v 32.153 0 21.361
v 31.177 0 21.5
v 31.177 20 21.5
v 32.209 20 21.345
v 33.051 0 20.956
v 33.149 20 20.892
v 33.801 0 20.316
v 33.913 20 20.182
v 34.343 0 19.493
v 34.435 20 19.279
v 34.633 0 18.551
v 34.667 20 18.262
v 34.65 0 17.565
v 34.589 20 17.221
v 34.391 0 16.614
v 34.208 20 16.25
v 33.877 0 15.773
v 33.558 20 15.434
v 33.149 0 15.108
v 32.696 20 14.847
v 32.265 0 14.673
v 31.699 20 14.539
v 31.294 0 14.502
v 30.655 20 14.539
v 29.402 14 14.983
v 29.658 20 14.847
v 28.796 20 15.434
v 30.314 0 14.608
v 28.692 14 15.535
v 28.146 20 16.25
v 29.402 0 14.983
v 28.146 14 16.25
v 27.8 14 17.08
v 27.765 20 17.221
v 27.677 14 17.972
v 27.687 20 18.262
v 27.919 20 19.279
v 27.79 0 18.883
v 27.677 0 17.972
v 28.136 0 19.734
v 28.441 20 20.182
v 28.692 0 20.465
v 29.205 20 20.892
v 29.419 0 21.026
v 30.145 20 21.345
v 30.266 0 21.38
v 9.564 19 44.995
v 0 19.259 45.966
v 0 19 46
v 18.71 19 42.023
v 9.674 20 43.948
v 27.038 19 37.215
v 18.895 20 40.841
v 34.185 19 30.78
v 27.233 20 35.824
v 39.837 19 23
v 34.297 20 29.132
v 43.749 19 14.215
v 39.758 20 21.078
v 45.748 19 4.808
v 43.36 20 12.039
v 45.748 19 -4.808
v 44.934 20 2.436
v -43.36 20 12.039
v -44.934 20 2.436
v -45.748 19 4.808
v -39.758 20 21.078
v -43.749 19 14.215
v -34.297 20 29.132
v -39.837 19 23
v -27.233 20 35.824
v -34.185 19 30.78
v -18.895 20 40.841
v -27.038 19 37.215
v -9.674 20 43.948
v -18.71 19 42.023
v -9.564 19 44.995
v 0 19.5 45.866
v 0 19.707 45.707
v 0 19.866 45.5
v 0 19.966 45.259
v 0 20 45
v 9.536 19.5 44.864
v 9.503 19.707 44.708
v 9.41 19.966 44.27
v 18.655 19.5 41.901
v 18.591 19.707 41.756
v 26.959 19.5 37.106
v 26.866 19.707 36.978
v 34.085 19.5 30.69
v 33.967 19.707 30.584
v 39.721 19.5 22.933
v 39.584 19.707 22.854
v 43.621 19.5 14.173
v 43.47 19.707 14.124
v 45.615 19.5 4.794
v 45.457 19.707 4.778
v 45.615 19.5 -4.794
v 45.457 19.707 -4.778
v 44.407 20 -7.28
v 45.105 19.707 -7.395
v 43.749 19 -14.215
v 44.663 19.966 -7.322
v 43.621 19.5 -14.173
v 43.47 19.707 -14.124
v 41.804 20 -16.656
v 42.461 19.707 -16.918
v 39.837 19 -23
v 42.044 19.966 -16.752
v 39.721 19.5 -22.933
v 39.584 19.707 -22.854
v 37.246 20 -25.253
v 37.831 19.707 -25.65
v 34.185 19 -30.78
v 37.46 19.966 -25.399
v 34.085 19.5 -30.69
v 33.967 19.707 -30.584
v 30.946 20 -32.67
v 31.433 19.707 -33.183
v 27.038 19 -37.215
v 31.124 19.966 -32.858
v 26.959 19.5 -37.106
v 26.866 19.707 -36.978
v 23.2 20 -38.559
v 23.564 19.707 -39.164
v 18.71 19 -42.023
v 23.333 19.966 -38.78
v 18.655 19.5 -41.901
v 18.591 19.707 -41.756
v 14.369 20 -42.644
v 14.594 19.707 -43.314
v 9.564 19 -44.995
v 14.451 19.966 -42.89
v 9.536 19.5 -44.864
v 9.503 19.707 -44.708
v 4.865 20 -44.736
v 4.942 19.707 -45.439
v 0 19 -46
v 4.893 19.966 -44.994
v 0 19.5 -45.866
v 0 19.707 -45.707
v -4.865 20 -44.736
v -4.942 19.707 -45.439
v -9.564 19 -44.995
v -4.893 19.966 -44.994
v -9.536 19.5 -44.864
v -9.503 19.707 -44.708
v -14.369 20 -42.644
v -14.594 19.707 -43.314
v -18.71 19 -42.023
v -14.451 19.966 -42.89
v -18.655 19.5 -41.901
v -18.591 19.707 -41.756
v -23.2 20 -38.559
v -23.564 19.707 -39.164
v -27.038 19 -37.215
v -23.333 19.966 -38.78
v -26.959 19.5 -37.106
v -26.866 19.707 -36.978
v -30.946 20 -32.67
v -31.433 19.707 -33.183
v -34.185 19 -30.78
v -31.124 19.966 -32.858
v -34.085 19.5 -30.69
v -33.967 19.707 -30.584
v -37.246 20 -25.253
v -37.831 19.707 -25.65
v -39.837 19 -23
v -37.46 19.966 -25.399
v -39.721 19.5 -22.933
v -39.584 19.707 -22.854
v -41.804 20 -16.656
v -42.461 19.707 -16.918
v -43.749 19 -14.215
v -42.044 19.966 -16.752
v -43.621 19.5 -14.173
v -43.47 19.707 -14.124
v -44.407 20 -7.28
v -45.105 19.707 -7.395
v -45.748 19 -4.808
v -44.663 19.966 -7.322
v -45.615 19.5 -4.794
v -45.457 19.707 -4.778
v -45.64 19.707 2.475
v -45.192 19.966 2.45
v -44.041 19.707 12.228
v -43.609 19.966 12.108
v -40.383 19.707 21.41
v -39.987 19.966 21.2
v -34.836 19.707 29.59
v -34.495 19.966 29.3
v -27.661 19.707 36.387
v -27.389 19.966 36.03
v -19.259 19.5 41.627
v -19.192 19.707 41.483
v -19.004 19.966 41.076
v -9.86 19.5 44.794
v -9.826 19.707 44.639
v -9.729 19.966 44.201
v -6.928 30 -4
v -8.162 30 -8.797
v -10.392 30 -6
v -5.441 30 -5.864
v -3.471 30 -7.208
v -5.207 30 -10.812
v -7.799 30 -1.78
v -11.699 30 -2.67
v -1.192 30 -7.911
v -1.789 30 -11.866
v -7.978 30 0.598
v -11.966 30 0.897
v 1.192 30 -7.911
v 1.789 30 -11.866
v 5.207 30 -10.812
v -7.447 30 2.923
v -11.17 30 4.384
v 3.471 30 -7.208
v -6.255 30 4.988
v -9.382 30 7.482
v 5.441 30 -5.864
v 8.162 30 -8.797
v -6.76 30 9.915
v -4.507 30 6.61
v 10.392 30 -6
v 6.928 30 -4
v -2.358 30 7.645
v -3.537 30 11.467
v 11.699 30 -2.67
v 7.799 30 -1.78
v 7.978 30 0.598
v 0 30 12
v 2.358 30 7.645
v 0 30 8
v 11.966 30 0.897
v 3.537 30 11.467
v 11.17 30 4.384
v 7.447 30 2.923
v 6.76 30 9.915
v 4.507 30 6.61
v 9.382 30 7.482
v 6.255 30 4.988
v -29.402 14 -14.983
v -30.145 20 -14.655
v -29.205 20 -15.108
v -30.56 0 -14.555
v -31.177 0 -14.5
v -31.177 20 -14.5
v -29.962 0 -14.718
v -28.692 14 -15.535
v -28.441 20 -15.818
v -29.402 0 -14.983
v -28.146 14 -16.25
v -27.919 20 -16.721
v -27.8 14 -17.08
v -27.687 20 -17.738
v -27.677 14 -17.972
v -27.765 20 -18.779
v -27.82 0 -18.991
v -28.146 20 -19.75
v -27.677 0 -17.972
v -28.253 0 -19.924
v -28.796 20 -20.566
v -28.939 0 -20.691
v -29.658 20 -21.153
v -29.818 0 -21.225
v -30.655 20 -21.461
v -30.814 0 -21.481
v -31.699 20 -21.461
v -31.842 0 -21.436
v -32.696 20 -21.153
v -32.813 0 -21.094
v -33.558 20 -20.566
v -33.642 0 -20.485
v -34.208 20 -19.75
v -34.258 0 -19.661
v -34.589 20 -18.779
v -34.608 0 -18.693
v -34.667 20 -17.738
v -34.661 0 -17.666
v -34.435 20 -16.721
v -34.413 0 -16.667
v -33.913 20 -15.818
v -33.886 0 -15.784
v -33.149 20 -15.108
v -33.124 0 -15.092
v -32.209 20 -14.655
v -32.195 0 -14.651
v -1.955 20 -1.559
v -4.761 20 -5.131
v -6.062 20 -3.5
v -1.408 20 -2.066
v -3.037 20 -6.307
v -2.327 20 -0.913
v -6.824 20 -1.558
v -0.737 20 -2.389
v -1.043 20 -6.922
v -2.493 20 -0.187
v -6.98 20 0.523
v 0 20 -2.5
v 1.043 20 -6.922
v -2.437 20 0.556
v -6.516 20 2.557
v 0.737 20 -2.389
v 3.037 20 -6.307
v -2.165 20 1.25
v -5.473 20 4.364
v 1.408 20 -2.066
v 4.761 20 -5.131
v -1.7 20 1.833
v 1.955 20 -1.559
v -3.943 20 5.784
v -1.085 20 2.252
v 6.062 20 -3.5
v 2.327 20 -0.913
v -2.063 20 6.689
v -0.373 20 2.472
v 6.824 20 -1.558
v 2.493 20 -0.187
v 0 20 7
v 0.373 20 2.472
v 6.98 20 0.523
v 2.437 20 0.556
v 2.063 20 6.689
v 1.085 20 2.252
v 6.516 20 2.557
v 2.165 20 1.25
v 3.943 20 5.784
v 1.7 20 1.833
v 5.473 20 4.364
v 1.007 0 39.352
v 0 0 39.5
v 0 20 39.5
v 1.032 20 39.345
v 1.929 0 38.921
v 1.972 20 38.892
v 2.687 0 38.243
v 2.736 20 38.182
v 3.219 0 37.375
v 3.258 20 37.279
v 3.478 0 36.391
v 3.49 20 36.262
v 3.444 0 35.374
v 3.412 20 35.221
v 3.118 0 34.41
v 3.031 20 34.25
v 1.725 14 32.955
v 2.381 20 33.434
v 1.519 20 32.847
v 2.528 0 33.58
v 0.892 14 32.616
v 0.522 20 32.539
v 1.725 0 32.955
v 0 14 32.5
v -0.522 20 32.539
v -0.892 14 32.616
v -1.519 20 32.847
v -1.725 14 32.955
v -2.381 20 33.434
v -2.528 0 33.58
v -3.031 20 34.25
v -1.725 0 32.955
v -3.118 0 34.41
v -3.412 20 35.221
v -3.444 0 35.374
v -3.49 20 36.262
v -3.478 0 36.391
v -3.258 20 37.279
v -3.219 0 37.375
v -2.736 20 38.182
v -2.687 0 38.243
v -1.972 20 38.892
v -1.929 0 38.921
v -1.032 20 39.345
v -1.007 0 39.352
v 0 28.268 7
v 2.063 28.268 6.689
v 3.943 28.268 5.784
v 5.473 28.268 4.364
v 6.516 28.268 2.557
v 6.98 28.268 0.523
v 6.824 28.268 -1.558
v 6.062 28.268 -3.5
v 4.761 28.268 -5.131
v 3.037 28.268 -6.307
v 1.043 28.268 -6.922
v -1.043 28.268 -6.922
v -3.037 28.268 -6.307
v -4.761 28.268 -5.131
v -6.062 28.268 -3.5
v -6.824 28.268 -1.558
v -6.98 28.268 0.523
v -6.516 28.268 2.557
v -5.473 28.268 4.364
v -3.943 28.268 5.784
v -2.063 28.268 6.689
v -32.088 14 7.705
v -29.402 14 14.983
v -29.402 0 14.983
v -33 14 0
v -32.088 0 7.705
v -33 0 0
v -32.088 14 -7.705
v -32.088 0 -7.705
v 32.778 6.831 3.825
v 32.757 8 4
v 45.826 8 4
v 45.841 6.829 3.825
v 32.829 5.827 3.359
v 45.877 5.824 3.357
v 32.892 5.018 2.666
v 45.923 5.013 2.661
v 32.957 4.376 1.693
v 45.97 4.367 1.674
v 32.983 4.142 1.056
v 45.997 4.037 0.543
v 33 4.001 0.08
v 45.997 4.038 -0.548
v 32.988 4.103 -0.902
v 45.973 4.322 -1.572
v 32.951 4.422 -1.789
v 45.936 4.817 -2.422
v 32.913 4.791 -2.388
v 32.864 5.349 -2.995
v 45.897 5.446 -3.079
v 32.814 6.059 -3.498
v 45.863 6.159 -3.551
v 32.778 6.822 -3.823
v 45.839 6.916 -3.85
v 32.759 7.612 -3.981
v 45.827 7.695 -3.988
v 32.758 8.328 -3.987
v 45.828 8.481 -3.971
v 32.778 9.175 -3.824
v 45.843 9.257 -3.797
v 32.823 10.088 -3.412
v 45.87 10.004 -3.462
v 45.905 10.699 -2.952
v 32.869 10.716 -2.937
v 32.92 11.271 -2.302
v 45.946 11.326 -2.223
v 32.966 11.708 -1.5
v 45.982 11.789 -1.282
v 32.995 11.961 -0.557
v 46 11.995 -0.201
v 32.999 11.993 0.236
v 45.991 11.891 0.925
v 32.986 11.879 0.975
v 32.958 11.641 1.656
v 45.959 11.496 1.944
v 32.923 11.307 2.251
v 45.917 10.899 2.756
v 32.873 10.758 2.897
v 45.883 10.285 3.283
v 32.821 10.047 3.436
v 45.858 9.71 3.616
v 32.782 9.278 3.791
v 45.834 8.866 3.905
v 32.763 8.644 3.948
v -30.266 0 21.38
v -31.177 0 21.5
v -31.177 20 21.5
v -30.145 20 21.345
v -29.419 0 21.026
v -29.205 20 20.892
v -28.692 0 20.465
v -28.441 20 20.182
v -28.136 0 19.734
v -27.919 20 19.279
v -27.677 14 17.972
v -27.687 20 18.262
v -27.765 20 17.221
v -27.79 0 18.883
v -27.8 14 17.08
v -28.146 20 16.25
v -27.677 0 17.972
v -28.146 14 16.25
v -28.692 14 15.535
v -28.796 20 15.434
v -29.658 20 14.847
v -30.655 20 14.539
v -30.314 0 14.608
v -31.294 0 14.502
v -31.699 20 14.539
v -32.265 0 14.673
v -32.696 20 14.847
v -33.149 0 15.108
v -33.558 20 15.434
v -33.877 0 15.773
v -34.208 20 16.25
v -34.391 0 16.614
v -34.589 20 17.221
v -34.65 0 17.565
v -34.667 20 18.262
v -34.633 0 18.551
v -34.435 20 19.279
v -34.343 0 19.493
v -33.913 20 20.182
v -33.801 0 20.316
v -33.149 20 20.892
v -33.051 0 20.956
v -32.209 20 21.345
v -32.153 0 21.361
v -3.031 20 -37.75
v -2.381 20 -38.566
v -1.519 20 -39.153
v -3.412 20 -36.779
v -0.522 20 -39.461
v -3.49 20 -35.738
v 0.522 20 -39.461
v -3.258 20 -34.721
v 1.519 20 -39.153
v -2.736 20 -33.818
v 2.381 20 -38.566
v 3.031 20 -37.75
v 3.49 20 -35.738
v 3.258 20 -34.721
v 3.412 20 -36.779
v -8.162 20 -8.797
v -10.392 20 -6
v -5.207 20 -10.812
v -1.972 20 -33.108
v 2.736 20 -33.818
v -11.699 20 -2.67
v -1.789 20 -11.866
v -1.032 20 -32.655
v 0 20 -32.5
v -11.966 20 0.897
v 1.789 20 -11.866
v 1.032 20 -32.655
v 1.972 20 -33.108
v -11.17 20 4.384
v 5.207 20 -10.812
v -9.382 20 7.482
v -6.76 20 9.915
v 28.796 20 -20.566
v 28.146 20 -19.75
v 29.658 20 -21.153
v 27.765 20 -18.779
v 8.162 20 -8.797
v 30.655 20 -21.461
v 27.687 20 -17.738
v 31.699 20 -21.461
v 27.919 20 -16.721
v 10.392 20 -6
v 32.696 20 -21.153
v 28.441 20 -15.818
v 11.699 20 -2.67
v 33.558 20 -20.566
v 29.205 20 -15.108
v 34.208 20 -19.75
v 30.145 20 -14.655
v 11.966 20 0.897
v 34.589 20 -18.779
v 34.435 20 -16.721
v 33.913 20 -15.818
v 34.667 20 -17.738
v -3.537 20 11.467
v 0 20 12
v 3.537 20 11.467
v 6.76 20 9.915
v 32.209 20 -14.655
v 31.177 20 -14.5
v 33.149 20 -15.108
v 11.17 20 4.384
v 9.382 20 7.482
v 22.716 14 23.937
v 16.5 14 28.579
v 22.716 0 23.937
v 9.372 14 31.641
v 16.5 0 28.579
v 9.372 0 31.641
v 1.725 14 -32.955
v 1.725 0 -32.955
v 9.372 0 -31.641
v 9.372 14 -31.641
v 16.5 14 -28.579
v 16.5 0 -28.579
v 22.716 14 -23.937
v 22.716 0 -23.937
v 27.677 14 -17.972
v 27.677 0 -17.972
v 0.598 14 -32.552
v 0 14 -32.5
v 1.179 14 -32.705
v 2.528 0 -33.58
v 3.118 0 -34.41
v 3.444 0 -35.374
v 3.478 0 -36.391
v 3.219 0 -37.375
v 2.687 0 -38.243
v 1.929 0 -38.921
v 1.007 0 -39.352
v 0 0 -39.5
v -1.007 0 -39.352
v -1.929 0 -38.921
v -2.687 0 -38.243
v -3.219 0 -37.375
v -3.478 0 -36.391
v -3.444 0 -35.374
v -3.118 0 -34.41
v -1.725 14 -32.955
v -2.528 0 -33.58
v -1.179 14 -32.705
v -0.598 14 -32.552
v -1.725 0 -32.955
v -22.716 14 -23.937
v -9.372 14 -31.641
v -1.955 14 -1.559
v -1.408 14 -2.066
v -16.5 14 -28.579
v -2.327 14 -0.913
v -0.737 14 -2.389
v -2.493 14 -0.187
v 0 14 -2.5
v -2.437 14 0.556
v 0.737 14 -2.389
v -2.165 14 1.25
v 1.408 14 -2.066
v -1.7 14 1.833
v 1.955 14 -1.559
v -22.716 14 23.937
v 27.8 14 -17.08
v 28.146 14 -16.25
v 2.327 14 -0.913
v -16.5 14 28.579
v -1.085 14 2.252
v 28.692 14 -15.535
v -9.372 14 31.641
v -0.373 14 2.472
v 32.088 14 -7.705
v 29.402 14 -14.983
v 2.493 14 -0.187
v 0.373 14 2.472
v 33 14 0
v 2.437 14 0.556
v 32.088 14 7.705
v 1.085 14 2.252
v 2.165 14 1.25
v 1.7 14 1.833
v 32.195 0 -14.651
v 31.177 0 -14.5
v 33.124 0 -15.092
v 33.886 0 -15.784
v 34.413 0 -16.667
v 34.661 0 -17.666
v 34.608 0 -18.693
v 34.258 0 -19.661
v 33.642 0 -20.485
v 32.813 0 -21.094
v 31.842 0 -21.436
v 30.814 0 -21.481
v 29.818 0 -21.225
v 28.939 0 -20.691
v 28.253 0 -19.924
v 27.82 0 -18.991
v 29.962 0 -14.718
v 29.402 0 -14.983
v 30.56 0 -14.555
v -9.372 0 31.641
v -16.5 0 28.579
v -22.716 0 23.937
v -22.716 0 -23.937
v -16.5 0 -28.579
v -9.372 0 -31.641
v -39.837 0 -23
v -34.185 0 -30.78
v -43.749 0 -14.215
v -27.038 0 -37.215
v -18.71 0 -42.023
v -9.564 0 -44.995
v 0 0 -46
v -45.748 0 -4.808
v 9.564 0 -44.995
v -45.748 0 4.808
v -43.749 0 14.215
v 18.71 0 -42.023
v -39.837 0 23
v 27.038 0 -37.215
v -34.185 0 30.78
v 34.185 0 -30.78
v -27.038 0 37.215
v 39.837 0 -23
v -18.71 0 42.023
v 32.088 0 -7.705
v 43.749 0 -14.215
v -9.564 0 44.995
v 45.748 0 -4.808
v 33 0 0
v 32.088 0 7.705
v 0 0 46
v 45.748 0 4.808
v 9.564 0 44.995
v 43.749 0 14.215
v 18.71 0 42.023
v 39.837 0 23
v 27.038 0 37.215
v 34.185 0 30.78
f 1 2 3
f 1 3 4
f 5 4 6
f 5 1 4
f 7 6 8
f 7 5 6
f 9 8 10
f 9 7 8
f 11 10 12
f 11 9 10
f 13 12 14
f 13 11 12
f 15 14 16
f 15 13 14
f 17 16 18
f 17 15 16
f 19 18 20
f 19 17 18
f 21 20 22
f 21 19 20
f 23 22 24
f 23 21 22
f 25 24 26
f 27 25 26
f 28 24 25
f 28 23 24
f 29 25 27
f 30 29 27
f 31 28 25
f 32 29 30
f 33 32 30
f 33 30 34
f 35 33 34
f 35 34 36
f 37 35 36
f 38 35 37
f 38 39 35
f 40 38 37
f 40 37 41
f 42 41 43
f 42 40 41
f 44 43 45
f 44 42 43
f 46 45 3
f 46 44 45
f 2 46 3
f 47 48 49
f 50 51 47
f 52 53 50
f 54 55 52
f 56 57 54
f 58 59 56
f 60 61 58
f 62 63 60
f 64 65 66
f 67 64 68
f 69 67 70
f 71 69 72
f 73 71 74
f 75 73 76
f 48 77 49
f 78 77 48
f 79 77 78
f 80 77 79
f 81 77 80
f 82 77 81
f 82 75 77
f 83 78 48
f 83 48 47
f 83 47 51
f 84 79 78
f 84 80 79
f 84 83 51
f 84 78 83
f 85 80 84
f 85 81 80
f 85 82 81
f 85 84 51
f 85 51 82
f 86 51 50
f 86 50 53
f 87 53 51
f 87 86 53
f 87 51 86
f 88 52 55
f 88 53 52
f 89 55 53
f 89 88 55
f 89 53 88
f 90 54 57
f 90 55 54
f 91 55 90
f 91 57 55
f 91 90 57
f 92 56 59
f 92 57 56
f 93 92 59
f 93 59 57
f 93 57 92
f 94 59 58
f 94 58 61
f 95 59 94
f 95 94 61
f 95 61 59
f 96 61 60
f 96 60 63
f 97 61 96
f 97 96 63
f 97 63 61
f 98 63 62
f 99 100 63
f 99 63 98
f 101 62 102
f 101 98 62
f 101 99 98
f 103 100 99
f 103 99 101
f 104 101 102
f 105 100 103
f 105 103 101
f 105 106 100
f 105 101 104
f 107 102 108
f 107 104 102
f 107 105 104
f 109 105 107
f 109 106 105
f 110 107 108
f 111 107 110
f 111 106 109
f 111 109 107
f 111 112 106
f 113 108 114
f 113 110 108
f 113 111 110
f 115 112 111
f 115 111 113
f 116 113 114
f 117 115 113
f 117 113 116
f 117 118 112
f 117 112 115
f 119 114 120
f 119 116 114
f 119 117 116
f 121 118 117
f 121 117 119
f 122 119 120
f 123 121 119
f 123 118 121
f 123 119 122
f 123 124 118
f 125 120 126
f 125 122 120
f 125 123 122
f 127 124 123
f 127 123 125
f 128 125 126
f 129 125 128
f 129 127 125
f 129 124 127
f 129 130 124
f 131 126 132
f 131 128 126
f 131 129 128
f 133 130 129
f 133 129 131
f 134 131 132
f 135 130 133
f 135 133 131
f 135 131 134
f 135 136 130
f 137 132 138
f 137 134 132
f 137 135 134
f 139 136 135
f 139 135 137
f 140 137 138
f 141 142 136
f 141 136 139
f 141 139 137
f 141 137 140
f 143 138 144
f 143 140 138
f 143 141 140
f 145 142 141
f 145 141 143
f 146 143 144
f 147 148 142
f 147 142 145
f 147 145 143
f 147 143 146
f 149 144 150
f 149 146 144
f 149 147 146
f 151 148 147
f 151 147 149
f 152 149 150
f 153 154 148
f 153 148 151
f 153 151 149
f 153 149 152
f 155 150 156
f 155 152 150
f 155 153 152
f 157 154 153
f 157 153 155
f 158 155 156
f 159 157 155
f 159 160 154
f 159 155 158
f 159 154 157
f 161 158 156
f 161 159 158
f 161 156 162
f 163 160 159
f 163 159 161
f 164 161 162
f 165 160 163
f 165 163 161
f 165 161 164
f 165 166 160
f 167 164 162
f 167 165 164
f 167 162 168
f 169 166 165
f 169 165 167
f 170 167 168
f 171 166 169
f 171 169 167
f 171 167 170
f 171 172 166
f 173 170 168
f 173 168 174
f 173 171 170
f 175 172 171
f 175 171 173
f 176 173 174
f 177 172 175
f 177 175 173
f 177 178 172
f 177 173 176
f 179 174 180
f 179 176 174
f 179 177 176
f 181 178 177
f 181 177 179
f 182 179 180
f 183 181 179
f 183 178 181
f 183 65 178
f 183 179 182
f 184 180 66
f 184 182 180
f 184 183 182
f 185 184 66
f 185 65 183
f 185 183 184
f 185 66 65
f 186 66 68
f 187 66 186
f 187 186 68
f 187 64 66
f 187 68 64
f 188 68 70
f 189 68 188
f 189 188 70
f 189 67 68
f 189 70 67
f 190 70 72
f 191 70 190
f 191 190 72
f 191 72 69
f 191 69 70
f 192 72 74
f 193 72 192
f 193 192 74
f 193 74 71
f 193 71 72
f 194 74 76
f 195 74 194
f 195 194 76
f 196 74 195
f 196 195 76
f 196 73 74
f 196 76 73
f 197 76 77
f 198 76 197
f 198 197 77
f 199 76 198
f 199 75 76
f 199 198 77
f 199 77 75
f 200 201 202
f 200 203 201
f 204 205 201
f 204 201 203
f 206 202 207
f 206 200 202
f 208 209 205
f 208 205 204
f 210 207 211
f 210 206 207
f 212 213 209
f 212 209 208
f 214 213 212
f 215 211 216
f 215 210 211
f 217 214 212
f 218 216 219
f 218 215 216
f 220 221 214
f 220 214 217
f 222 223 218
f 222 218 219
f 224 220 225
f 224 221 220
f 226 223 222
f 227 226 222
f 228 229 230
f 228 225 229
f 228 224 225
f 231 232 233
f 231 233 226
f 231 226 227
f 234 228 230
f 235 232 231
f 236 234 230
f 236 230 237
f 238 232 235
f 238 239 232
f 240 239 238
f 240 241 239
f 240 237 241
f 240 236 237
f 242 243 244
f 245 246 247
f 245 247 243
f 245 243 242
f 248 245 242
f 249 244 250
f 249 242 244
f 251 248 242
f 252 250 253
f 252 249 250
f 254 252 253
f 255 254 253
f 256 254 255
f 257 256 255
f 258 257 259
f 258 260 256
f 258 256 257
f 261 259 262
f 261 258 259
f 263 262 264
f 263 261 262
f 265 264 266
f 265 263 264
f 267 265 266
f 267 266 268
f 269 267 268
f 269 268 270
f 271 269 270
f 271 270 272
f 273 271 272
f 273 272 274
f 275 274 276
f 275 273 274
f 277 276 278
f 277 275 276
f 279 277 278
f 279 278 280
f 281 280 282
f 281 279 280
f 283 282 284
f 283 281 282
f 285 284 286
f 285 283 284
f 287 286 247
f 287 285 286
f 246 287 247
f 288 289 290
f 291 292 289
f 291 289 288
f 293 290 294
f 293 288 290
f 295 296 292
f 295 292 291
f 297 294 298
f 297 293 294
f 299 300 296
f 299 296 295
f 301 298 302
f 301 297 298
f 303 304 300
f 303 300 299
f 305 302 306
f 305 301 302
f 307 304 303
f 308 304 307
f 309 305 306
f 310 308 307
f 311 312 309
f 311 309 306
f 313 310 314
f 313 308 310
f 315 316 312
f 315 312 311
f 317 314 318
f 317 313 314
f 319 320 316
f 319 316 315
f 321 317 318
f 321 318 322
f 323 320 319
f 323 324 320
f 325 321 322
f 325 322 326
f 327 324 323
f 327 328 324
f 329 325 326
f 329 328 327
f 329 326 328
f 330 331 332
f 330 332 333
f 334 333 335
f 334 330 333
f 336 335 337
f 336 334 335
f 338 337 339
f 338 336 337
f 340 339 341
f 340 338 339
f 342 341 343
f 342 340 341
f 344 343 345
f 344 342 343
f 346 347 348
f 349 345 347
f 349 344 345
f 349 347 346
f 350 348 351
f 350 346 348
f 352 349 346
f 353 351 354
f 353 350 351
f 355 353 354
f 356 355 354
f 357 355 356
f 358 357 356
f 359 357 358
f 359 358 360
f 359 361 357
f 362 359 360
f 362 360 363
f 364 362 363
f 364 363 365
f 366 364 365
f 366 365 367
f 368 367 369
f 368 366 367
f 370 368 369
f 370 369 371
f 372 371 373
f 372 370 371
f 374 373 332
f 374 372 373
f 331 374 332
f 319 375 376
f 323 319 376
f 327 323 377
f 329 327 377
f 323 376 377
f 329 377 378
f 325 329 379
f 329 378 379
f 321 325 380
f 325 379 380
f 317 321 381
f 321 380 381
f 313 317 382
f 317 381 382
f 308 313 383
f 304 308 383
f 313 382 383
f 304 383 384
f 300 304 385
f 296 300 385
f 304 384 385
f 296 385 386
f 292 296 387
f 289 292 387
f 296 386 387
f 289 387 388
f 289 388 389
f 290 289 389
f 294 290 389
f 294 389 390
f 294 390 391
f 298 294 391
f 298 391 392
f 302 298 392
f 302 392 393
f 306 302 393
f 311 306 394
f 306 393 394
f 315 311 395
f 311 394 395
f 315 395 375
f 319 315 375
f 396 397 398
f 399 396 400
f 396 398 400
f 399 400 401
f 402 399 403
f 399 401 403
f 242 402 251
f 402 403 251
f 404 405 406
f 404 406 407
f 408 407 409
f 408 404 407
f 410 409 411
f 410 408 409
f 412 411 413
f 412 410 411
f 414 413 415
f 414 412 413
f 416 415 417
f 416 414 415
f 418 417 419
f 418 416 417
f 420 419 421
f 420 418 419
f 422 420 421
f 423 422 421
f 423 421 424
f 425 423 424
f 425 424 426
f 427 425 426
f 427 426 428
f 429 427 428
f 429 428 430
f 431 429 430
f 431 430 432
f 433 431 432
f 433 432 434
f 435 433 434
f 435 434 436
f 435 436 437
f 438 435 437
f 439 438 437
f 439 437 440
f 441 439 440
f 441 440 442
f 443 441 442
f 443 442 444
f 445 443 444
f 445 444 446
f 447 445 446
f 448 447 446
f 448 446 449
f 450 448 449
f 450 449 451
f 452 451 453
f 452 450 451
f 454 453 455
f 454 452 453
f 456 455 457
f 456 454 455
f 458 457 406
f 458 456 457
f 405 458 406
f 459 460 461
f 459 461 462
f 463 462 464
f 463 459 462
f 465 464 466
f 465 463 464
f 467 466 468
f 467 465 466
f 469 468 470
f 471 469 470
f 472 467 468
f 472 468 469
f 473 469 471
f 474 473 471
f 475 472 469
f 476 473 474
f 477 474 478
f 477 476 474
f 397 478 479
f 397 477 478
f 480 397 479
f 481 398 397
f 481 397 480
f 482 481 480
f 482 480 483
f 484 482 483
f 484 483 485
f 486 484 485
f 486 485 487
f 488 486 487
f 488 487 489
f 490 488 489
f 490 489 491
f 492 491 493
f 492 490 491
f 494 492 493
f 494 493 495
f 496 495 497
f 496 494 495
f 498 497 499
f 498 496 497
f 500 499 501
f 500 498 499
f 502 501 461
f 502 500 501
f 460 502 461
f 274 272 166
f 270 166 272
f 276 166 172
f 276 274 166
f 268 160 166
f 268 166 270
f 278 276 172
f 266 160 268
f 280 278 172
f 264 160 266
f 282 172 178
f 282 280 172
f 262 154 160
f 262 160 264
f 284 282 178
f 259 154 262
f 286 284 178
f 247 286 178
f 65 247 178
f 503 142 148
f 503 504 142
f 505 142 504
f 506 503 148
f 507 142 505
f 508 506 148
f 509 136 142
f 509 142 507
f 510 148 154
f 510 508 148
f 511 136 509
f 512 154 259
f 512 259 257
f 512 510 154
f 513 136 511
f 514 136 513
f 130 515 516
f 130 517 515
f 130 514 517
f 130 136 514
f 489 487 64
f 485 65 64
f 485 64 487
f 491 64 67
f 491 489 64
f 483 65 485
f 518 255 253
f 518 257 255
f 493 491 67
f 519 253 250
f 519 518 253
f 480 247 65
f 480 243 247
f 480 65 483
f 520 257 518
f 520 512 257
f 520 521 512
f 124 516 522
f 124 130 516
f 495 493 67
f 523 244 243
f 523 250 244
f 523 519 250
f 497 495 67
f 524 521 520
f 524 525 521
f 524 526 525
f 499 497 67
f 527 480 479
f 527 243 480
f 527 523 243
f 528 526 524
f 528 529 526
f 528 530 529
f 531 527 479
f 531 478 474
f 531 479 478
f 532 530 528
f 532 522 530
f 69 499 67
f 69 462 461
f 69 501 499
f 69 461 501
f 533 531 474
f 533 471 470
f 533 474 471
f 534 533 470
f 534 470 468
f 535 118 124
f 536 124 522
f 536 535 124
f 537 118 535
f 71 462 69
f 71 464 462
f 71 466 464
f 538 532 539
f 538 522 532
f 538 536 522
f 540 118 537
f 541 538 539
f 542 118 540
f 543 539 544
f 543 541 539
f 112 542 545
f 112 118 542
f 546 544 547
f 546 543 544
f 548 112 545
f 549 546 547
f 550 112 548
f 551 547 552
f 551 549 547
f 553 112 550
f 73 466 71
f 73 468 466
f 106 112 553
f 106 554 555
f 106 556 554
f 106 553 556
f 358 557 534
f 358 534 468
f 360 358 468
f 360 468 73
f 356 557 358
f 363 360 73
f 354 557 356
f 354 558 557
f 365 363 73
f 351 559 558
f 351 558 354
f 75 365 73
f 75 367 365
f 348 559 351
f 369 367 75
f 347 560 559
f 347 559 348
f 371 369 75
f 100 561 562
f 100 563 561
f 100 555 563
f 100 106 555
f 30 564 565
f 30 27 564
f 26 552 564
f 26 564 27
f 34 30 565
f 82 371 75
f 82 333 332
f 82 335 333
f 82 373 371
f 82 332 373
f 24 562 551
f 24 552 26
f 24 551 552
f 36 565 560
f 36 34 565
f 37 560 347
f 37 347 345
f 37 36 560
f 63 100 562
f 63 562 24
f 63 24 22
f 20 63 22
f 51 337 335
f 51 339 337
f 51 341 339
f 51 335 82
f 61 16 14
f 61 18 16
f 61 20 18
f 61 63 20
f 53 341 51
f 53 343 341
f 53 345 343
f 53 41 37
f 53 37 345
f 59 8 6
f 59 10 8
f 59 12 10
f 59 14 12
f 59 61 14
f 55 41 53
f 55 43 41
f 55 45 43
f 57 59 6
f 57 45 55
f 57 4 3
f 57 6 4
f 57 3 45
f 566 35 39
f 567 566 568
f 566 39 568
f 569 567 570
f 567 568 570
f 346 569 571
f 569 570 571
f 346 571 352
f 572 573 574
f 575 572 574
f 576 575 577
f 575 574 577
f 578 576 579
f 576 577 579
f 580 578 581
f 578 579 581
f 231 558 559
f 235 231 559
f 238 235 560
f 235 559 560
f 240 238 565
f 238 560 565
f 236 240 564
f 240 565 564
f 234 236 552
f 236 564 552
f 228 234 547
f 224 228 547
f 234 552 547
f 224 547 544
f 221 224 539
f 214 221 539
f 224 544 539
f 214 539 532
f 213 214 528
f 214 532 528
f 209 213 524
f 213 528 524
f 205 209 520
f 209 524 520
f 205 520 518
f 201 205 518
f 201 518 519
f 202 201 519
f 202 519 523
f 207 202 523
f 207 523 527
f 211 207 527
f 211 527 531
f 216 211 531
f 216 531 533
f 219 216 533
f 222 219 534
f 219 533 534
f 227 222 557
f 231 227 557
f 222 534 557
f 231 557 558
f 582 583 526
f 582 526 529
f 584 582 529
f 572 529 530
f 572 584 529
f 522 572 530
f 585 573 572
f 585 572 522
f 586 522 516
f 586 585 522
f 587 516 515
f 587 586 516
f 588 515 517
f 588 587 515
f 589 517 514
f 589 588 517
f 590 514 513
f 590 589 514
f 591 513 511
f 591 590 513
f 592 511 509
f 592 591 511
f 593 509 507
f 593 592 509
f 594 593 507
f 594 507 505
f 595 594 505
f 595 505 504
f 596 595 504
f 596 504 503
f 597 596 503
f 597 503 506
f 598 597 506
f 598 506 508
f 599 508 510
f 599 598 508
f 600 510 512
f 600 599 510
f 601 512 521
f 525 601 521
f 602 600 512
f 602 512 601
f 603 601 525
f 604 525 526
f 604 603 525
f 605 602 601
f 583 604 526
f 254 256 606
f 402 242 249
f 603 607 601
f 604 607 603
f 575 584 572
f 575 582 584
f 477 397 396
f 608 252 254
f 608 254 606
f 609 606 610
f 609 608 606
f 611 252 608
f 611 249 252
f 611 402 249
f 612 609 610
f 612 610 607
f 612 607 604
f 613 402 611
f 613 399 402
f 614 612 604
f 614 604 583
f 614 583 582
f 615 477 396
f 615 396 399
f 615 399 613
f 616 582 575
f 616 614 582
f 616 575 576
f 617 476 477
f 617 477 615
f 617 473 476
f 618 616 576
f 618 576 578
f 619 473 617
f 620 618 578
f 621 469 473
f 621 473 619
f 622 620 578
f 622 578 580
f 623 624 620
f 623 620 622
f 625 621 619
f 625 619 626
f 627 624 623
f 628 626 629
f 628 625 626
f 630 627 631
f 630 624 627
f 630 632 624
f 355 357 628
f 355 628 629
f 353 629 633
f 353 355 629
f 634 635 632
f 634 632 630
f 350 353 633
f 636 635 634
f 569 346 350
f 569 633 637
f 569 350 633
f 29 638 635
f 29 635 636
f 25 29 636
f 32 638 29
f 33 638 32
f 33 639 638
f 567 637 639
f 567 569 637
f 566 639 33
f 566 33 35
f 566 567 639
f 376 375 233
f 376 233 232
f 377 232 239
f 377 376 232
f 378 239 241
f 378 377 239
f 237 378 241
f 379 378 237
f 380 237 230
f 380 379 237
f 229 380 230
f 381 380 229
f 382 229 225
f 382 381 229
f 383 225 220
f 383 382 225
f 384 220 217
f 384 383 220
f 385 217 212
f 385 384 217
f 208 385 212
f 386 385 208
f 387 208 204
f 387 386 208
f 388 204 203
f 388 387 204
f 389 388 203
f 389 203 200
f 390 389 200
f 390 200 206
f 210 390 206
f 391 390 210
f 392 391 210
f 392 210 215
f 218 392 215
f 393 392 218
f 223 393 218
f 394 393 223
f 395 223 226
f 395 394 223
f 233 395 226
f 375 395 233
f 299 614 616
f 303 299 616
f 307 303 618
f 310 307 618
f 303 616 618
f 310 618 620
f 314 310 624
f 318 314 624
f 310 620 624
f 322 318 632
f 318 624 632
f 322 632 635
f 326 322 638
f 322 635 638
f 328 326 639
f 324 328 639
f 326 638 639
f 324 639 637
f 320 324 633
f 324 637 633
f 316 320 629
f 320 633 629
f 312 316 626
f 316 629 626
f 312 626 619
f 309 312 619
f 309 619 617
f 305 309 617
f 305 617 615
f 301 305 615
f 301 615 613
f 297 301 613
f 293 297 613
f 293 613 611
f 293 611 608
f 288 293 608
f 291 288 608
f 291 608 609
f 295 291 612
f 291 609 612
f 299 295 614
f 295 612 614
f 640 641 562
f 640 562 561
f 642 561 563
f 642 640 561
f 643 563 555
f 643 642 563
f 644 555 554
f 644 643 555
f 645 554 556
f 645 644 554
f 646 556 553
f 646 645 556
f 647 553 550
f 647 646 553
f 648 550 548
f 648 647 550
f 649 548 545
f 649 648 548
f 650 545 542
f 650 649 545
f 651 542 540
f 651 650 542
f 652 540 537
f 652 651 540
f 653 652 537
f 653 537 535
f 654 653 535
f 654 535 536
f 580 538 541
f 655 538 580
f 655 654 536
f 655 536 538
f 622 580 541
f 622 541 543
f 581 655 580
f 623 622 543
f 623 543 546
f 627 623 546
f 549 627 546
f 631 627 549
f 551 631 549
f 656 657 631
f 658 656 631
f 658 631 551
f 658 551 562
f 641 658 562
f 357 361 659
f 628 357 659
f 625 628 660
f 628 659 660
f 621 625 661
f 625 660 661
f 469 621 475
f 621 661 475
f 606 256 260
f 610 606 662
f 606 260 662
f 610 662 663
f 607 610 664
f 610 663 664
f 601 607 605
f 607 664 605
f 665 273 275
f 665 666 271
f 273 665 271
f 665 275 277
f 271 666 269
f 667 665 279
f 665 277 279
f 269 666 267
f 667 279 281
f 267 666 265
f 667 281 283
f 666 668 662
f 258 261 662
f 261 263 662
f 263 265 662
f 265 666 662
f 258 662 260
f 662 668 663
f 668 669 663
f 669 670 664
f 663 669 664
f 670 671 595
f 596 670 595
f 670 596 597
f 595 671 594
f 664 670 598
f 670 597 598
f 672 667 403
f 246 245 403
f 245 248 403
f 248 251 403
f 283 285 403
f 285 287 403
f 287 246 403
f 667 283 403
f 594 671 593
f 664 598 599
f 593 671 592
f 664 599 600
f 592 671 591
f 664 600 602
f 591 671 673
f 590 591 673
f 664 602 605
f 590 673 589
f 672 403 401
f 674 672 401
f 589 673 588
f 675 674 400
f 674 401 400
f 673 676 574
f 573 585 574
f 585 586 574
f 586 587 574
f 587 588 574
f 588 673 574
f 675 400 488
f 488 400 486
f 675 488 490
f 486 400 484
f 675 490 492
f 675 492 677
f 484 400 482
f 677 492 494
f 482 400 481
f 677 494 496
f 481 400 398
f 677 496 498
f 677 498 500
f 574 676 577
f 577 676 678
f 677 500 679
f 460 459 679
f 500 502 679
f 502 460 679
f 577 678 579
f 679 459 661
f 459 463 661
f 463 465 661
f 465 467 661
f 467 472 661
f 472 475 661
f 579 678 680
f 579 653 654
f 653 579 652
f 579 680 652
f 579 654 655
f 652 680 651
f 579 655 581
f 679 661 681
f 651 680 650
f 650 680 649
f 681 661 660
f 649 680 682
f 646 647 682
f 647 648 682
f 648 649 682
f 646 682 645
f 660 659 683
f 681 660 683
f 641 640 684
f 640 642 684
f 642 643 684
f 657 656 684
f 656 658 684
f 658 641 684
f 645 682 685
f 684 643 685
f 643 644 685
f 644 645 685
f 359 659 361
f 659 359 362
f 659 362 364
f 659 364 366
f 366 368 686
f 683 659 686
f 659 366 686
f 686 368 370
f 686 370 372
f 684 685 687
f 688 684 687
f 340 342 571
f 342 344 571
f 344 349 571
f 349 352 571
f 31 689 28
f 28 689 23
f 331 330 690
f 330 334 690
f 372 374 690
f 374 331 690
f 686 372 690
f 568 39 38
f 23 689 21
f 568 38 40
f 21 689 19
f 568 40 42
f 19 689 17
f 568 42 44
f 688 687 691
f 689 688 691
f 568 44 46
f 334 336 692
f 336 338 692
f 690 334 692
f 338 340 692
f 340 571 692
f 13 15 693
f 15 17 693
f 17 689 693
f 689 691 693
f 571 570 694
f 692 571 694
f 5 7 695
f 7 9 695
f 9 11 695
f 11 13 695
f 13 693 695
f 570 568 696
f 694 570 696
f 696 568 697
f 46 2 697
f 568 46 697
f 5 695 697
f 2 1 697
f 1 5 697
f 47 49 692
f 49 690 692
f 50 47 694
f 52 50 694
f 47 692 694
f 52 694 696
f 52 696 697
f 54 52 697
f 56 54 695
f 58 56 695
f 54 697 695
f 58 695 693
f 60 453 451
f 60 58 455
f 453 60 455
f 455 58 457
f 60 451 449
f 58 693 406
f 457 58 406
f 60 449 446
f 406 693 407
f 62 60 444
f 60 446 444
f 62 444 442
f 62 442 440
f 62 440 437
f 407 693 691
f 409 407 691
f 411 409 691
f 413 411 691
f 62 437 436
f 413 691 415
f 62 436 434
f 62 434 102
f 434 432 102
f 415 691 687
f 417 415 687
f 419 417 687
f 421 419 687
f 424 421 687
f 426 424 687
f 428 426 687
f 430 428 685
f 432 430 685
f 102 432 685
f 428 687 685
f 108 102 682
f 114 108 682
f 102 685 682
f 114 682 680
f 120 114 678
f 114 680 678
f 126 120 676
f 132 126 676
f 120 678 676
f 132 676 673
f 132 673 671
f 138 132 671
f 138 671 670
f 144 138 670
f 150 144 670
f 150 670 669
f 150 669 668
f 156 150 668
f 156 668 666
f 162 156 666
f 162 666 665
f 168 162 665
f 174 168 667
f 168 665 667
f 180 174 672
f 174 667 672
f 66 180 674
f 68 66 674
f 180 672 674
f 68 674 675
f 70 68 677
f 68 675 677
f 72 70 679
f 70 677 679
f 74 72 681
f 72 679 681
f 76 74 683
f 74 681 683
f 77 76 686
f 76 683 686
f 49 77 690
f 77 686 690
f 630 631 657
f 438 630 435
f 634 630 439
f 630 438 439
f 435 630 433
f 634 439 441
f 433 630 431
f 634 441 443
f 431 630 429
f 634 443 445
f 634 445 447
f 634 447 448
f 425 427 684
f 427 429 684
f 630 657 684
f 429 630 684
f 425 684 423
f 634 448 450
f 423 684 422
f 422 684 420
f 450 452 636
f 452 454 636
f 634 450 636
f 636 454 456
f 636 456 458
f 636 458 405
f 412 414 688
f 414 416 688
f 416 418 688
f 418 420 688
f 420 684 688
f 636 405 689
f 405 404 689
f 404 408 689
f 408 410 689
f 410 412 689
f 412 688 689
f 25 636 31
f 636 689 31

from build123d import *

# Parameters (mm, degrees)
SKETCH1_R           = 46
SKETCH1_R_2         = 3.5
BOSS_EXTRUDE1_DEPTH = 20
FILLET1_R           = 1
SKETCH2_R           = 12
BOSS_EXTRUDE2_DEPTH = 10
SKETCH3_R           = 33
CUT_EXTRUDE1_DEPTH  = 14
SKETCH4_R           = 2.5
CUT_EXTRUDE2_DEPTH  = 6
SKETCH5_R           = 7
CUT_EXTRUDE3_DEPTH  = 10
CHAMFER1_SIZE       = 1
CHAMFER1_SIZE2      = 1.732050808
SKETCH6_R           = 4
CUT_EXTRUDE4_DEPTH  = 80


with BuildPart() as part:
    # Sketch1 → Boss-Extrude1 (new body)
    with BuildSketch(Plane(origin=(0, 0, 0), x_dir=(1, 0, 0), z_dir=(0, 1, 0))):
        with Locations(Location((0, 0, 0), (0, 0, 270))):
            Circle(SKETCH1_R)
        with Locations(Location((0, 36, 0), (0, 0, 270))):
            Circle(SKETCH1_R_2, mode=Mode.SUBTRACT)
        with Locations(Location((31.176914536, 18, 0), (0, 0, 270))):
            Circle(SKETCH1_R_2, mode=Mode.SUBTRACT)
        with Locations(Location((31.176914536, -18, 0), (0, 0, 270))):
            Circle(SKETCH1_R_2, mode=Mode.SUBTRACT)
        with Locations(Location((0, -36, 0), (0, 0, 270))):
            Circle(SKETCH1_R_2, mode=Mode.SUBTRACT)
        with Locations(Location((-31.176914536, -18, 0), (0, 0, 270))):
            Circle(SKETCH1_R_2, mode=Mode.SUBTRACT)
        with Locations(Location((-31.176914536, 18, 0), (0, 0, 270))):
            Circle(SKETCH1_R_2, mode=Mode.SUBTRACT)
    extrude(amount=BOSS_EXTRUDE1_DEPTH)

    # Fillet1
    fillet1_edges = [part.edges().sort_by_distance(p)[0] for p in [
        (0, 20, -46),
    ]]
    fillet(fillet1_edges, radius=FILLET1_R)

    # Sketch2 → Boss-Extrude2 (add)
    with BuildSketch(Plane(origin=(0, 20, 0), x_dir=(1, 0, 0), z_dir=(0, 1, 0))):
        with Locations(Location((0, 0, 0), (0, 0, 270))):
            Circle(SKETCH2_R)
    extrude(amount=BOSS_EXTRUDE2_DEPTH)

    # Sketch3 → Cut-Extrude1 (cut)
    with BuildSketch(Plane.XZ):
        Circle(SKETCH3_R)
    extrude(amount=-CUT_EXTRUDE1_DEPTH, mode=Mode.SUBTRACT)

    # Sketch4 → Cut-Extrude2 (cut)
    with BuildSketch(Plane.XZ.offset(-14)):
        with Locations(Location((0, 0, 0), (0, 0, 270))):
            Circle(SKETCH4_R)
    extrude(amount=-CUT_EXTRUDE2_DEPTH, mode=Mode.SUBTRACT)

    # Sketch5 → Cut-Extrude3 (cut)
    with BuildSketch(Plane(origin=(0, 30, 0), x_dir=(1, 0, 0), z_dir=(0, 1, 0))):
        with Locations(Location((0, 0, 0), (0, 0, 270))):
            Circle(SKETCH5_R)
    extrude(amount=-CUT_EXTRUDE3_DEPTH, mode=Mode.SUBTRACT)

    # Chamfer1
    chamfer1_edges = [part.edges().sort_by_distance(p)[0] for p in [
        (0, 30, -7),
    ]]
    chamfer1_side = [part.faces().sort_by_distance(p)[0] for p in [
        (0, 30, -11.660588745),
    ]]
    chamfer(chamfer1_edges, length=CHAMFER1_SIZE, length2=CHAMFER1_SIZE2, reference=chamfer1_side[0])

    # Sketch6 → Cut-Extrude4 (cut)
    with BuildSketch(Plane(origin=(0, 0, 0), x_dir=(0, 0, -1), z_dir=(1, 0, 0))):
        with Locations(Location((0, 8, 0), (0, 0, 180))):
            Circle(SKETCH6_R)
    extrude(amount=CUT_EXTRUDE4_DEPTH, mode=Mode.SUBTRACT)


solid = part.part
